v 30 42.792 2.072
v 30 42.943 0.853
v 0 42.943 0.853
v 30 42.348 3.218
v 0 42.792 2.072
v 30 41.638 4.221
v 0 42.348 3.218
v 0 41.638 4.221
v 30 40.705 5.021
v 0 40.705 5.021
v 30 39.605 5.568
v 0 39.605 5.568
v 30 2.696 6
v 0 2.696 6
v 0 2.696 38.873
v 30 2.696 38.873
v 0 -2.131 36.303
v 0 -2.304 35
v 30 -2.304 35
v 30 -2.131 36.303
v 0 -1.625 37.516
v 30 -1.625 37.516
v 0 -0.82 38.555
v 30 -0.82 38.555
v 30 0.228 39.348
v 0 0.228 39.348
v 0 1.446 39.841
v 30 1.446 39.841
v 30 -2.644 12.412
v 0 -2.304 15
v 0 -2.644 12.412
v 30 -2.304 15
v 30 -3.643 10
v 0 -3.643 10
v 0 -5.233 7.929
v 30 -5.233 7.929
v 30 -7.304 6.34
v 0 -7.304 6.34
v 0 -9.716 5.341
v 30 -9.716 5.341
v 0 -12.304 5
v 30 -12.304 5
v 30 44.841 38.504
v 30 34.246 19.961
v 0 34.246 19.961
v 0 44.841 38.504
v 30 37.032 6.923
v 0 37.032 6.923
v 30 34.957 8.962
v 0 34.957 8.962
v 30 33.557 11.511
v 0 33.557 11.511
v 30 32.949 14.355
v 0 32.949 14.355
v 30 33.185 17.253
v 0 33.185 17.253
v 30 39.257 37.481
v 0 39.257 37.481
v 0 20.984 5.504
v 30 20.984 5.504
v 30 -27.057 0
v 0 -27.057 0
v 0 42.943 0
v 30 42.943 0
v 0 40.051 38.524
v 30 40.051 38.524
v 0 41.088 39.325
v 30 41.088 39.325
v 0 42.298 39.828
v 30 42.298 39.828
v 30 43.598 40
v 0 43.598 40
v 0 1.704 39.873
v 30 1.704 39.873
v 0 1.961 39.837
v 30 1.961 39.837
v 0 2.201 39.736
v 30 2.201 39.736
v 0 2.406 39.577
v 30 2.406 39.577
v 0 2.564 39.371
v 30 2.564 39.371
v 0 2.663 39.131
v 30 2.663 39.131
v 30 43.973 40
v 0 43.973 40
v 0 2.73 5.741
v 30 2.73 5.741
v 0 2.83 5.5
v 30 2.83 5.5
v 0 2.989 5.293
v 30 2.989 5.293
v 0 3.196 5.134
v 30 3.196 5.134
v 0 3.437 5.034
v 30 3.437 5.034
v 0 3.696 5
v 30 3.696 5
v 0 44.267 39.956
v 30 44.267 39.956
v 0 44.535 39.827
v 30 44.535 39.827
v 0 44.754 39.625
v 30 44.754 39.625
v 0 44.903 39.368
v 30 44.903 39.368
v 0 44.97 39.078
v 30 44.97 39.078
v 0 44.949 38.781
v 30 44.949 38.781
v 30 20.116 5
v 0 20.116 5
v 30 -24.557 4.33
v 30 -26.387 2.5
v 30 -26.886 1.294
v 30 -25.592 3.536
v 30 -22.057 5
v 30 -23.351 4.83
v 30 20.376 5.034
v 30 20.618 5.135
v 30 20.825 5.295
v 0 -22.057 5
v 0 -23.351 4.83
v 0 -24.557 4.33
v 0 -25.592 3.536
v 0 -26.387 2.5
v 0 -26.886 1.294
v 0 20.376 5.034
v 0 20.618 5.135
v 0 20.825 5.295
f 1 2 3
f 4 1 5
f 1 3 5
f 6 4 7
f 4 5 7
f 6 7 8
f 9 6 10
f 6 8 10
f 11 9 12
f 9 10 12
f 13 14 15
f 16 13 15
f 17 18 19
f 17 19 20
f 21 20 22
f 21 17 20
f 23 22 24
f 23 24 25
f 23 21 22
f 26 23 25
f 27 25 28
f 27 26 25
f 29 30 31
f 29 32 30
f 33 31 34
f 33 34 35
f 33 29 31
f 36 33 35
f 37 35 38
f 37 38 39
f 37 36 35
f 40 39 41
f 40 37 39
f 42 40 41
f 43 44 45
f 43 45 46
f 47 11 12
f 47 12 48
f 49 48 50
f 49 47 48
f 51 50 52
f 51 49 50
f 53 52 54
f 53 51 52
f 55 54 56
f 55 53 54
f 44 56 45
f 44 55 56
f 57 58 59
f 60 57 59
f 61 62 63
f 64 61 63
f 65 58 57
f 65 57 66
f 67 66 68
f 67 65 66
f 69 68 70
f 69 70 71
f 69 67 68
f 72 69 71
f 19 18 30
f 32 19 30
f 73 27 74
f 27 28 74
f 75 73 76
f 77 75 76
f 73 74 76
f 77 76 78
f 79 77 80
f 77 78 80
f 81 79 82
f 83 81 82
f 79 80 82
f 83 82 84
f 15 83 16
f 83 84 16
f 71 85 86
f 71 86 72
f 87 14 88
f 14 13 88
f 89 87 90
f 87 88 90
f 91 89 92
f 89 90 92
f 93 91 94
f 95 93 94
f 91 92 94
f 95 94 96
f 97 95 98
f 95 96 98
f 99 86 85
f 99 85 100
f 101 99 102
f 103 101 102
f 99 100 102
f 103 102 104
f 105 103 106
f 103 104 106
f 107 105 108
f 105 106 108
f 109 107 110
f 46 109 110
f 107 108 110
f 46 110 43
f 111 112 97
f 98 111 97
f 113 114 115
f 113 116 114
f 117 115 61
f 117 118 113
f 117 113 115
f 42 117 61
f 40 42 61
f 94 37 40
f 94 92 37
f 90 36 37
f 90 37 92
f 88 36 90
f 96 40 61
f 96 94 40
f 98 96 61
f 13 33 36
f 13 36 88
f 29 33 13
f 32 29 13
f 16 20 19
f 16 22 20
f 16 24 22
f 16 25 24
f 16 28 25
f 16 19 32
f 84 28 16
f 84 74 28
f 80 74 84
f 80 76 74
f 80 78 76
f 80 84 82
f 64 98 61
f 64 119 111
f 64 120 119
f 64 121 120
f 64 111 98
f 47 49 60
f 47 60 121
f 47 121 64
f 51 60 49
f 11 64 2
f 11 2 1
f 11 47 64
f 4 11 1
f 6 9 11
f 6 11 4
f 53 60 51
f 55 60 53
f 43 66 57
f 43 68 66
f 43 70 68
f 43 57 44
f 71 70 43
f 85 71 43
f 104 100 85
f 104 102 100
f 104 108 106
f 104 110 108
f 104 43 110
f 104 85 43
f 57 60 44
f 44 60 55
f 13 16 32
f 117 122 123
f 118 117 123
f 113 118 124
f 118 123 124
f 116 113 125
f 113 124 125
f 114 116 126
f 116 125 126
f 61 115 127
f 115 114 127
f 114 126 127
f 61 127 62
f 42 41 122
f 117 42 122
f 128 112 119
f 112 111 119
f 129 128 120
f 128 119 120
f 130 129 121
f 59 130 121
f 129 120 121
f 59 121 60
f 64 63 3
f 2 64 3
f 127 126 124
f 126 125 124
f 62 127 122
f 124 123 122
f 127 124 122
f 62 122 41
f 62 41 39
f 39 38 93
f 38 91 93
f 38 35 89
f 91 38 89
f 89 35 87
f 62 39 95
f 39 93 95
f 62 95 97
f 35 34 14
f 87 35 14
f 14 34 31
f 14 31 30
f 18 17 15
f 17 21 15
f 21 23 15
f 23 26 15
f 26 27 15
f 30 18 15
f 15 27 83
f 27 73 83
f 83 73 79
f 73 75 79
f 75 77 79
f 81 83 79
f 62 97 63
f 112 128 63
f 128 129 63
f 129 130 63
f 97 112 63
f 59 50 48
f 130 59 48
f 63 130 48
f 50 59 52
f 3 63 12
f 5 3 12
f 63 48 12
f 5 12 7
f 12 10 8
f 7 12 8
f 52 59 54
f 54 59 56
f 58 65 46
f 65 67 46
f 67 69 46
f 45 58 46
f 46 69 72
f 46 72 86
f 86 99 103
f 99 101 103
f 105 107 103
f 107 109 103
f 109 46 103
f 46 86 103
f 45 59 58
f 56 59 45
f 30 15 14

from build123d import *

# Parameters (mm, degrees)
F1_DEPTH    = 30
F2_R        = 10
F3_T1_DEPTH = 56.2345635929
F3_T3_DEPTH = 50.7373541457
F3_T5_DEPTH = 44.5080633868
F3_T7_DEPTH = 55
F4_R        = 1


# Not quite as in the source:
# - a fillet or chamfer that OpenCascade refuses, or shapes differently, is made with other operations: its cross-section is extruded or revolved along the edge and cut away or added


with BuildPart() as f1:
    # F0 (on Right) → F1 (new body)
    with BuildSketch(Plane.YZ):
        Polygon((-27.3037352718, 5), (-27.0568225533, 0), (42.9431774467, 0), (42.9431774467, 5), (25.6962647282, 5), (45.6962647282, 40), (40.6962647282, 40), (20.6962647282, 5), (8.8888889937, 5), (2.6962647282, 5), (2.6962647282, 40), (-2.3037352718, 40), (-2.3037352718, 5), align=None)
    extrude(amount=F1_DEPTH)

    # F2
    f2_edges = [f1.edges().sort_by_distance(p)[0] for p in [
        (15, 25.696265, 5),
        (15, -2.303735, 5),
    ]]
    fillet(f2_edges, radius=F2_R)

    # F3: fillet of radius 5 on 4 edges, made by hand

    # F3_s2 → F3_t1 (cut)
    with BuildSketch(Plane.YZ.offset(-13.1172817964)):
        with BuildLine():
            ThreePointArc((-22.0568225533, 5), (-25.5923564592, 3.5355339059), (-27.0568225533, 0))
            Line((-27.0568225533, 0), (-27.3037352718, 5))
            Line((-27.3037352718, 5), (-22.0568225533, 5))
        make_face()
    extrude(amount=F3_T1_DEPTH, mode=Mode.SUBTRACT)

    # F3_s4 → F3_t3 (cut)
    with BuildSketch(Plane.YZ.offset(-10.3686770729)):
        with BuildLine():
            ThreePointArc((42.9431774467, 0.8525291709), (42.0241172961, 3.7414614903), (39.6048054683, 5.5683527806))
            Line((39.6048054683, 5.5683527806), (39.7709682705, 6.0399351415))
            ThreePointArc((39.7709682705, 6.0399351415), (42.9280615114, 5.5), (42.9431774467, 5.5))
            Line((42.9431774467, 5.5), (43.4431774467, 5))
            Line((43.4431774467, 5), (43.4431774467, 0.8525291709))
            Line((43.4431774467, 0.8525291709), (42.9431774467, 0.8525291709))
        make_face()
    extrude(amount=F3_T3_DEPTH, mode=Mode.SUBTRACT)

    # F3_s6 → F3_t5 (cut)
    with BuildSketch(Plane.YZ.offset(-7.2540316934)):
        with BuildLine():
            ThreePointArc((39.2566616949, 37.4806946918), (41.0882433145, 39.3245504656), (43.5978774055, 40))
            Line((43.5978774055, 40), (40.6962647282, 40))
            Line((40.6962647282, 40), (39.2566616949, 37.4806946918))
        make_face()
    extrude(amount=F3_T5_DEPTH, mode=Mode.SUBTRACT)

    # F3_s8 → F3_t7 (cut)
    with BuildSketch(Plane.YZ.offset(-12.5)):
        with BuildLine():
            ThreePointArc((-2.3037352718, 35), (-0.8392691778, 38.5355339059), (2.6962647282, 40))
            Line((2.6962647282, 40), (-2.3037352718, 40))
            Line((-2.3037352718, 40), (-2.3037352718, 35))
        make_face()
    extrude(amount=F3_T7_DEPTH, mode=Mode.SUBTRACT)

    # F4
    f4_edges = [f1.edges().sort_by_distance(p)[0] for p in [
        (15, 2.696265, 5),
        (15, 20.696265, 5),
        (15, 2.696265, 40),
        (15, 45.696265, 40),
    ]]
    fillet(f4_edges, radius=F4_R)


solid = f1.part
